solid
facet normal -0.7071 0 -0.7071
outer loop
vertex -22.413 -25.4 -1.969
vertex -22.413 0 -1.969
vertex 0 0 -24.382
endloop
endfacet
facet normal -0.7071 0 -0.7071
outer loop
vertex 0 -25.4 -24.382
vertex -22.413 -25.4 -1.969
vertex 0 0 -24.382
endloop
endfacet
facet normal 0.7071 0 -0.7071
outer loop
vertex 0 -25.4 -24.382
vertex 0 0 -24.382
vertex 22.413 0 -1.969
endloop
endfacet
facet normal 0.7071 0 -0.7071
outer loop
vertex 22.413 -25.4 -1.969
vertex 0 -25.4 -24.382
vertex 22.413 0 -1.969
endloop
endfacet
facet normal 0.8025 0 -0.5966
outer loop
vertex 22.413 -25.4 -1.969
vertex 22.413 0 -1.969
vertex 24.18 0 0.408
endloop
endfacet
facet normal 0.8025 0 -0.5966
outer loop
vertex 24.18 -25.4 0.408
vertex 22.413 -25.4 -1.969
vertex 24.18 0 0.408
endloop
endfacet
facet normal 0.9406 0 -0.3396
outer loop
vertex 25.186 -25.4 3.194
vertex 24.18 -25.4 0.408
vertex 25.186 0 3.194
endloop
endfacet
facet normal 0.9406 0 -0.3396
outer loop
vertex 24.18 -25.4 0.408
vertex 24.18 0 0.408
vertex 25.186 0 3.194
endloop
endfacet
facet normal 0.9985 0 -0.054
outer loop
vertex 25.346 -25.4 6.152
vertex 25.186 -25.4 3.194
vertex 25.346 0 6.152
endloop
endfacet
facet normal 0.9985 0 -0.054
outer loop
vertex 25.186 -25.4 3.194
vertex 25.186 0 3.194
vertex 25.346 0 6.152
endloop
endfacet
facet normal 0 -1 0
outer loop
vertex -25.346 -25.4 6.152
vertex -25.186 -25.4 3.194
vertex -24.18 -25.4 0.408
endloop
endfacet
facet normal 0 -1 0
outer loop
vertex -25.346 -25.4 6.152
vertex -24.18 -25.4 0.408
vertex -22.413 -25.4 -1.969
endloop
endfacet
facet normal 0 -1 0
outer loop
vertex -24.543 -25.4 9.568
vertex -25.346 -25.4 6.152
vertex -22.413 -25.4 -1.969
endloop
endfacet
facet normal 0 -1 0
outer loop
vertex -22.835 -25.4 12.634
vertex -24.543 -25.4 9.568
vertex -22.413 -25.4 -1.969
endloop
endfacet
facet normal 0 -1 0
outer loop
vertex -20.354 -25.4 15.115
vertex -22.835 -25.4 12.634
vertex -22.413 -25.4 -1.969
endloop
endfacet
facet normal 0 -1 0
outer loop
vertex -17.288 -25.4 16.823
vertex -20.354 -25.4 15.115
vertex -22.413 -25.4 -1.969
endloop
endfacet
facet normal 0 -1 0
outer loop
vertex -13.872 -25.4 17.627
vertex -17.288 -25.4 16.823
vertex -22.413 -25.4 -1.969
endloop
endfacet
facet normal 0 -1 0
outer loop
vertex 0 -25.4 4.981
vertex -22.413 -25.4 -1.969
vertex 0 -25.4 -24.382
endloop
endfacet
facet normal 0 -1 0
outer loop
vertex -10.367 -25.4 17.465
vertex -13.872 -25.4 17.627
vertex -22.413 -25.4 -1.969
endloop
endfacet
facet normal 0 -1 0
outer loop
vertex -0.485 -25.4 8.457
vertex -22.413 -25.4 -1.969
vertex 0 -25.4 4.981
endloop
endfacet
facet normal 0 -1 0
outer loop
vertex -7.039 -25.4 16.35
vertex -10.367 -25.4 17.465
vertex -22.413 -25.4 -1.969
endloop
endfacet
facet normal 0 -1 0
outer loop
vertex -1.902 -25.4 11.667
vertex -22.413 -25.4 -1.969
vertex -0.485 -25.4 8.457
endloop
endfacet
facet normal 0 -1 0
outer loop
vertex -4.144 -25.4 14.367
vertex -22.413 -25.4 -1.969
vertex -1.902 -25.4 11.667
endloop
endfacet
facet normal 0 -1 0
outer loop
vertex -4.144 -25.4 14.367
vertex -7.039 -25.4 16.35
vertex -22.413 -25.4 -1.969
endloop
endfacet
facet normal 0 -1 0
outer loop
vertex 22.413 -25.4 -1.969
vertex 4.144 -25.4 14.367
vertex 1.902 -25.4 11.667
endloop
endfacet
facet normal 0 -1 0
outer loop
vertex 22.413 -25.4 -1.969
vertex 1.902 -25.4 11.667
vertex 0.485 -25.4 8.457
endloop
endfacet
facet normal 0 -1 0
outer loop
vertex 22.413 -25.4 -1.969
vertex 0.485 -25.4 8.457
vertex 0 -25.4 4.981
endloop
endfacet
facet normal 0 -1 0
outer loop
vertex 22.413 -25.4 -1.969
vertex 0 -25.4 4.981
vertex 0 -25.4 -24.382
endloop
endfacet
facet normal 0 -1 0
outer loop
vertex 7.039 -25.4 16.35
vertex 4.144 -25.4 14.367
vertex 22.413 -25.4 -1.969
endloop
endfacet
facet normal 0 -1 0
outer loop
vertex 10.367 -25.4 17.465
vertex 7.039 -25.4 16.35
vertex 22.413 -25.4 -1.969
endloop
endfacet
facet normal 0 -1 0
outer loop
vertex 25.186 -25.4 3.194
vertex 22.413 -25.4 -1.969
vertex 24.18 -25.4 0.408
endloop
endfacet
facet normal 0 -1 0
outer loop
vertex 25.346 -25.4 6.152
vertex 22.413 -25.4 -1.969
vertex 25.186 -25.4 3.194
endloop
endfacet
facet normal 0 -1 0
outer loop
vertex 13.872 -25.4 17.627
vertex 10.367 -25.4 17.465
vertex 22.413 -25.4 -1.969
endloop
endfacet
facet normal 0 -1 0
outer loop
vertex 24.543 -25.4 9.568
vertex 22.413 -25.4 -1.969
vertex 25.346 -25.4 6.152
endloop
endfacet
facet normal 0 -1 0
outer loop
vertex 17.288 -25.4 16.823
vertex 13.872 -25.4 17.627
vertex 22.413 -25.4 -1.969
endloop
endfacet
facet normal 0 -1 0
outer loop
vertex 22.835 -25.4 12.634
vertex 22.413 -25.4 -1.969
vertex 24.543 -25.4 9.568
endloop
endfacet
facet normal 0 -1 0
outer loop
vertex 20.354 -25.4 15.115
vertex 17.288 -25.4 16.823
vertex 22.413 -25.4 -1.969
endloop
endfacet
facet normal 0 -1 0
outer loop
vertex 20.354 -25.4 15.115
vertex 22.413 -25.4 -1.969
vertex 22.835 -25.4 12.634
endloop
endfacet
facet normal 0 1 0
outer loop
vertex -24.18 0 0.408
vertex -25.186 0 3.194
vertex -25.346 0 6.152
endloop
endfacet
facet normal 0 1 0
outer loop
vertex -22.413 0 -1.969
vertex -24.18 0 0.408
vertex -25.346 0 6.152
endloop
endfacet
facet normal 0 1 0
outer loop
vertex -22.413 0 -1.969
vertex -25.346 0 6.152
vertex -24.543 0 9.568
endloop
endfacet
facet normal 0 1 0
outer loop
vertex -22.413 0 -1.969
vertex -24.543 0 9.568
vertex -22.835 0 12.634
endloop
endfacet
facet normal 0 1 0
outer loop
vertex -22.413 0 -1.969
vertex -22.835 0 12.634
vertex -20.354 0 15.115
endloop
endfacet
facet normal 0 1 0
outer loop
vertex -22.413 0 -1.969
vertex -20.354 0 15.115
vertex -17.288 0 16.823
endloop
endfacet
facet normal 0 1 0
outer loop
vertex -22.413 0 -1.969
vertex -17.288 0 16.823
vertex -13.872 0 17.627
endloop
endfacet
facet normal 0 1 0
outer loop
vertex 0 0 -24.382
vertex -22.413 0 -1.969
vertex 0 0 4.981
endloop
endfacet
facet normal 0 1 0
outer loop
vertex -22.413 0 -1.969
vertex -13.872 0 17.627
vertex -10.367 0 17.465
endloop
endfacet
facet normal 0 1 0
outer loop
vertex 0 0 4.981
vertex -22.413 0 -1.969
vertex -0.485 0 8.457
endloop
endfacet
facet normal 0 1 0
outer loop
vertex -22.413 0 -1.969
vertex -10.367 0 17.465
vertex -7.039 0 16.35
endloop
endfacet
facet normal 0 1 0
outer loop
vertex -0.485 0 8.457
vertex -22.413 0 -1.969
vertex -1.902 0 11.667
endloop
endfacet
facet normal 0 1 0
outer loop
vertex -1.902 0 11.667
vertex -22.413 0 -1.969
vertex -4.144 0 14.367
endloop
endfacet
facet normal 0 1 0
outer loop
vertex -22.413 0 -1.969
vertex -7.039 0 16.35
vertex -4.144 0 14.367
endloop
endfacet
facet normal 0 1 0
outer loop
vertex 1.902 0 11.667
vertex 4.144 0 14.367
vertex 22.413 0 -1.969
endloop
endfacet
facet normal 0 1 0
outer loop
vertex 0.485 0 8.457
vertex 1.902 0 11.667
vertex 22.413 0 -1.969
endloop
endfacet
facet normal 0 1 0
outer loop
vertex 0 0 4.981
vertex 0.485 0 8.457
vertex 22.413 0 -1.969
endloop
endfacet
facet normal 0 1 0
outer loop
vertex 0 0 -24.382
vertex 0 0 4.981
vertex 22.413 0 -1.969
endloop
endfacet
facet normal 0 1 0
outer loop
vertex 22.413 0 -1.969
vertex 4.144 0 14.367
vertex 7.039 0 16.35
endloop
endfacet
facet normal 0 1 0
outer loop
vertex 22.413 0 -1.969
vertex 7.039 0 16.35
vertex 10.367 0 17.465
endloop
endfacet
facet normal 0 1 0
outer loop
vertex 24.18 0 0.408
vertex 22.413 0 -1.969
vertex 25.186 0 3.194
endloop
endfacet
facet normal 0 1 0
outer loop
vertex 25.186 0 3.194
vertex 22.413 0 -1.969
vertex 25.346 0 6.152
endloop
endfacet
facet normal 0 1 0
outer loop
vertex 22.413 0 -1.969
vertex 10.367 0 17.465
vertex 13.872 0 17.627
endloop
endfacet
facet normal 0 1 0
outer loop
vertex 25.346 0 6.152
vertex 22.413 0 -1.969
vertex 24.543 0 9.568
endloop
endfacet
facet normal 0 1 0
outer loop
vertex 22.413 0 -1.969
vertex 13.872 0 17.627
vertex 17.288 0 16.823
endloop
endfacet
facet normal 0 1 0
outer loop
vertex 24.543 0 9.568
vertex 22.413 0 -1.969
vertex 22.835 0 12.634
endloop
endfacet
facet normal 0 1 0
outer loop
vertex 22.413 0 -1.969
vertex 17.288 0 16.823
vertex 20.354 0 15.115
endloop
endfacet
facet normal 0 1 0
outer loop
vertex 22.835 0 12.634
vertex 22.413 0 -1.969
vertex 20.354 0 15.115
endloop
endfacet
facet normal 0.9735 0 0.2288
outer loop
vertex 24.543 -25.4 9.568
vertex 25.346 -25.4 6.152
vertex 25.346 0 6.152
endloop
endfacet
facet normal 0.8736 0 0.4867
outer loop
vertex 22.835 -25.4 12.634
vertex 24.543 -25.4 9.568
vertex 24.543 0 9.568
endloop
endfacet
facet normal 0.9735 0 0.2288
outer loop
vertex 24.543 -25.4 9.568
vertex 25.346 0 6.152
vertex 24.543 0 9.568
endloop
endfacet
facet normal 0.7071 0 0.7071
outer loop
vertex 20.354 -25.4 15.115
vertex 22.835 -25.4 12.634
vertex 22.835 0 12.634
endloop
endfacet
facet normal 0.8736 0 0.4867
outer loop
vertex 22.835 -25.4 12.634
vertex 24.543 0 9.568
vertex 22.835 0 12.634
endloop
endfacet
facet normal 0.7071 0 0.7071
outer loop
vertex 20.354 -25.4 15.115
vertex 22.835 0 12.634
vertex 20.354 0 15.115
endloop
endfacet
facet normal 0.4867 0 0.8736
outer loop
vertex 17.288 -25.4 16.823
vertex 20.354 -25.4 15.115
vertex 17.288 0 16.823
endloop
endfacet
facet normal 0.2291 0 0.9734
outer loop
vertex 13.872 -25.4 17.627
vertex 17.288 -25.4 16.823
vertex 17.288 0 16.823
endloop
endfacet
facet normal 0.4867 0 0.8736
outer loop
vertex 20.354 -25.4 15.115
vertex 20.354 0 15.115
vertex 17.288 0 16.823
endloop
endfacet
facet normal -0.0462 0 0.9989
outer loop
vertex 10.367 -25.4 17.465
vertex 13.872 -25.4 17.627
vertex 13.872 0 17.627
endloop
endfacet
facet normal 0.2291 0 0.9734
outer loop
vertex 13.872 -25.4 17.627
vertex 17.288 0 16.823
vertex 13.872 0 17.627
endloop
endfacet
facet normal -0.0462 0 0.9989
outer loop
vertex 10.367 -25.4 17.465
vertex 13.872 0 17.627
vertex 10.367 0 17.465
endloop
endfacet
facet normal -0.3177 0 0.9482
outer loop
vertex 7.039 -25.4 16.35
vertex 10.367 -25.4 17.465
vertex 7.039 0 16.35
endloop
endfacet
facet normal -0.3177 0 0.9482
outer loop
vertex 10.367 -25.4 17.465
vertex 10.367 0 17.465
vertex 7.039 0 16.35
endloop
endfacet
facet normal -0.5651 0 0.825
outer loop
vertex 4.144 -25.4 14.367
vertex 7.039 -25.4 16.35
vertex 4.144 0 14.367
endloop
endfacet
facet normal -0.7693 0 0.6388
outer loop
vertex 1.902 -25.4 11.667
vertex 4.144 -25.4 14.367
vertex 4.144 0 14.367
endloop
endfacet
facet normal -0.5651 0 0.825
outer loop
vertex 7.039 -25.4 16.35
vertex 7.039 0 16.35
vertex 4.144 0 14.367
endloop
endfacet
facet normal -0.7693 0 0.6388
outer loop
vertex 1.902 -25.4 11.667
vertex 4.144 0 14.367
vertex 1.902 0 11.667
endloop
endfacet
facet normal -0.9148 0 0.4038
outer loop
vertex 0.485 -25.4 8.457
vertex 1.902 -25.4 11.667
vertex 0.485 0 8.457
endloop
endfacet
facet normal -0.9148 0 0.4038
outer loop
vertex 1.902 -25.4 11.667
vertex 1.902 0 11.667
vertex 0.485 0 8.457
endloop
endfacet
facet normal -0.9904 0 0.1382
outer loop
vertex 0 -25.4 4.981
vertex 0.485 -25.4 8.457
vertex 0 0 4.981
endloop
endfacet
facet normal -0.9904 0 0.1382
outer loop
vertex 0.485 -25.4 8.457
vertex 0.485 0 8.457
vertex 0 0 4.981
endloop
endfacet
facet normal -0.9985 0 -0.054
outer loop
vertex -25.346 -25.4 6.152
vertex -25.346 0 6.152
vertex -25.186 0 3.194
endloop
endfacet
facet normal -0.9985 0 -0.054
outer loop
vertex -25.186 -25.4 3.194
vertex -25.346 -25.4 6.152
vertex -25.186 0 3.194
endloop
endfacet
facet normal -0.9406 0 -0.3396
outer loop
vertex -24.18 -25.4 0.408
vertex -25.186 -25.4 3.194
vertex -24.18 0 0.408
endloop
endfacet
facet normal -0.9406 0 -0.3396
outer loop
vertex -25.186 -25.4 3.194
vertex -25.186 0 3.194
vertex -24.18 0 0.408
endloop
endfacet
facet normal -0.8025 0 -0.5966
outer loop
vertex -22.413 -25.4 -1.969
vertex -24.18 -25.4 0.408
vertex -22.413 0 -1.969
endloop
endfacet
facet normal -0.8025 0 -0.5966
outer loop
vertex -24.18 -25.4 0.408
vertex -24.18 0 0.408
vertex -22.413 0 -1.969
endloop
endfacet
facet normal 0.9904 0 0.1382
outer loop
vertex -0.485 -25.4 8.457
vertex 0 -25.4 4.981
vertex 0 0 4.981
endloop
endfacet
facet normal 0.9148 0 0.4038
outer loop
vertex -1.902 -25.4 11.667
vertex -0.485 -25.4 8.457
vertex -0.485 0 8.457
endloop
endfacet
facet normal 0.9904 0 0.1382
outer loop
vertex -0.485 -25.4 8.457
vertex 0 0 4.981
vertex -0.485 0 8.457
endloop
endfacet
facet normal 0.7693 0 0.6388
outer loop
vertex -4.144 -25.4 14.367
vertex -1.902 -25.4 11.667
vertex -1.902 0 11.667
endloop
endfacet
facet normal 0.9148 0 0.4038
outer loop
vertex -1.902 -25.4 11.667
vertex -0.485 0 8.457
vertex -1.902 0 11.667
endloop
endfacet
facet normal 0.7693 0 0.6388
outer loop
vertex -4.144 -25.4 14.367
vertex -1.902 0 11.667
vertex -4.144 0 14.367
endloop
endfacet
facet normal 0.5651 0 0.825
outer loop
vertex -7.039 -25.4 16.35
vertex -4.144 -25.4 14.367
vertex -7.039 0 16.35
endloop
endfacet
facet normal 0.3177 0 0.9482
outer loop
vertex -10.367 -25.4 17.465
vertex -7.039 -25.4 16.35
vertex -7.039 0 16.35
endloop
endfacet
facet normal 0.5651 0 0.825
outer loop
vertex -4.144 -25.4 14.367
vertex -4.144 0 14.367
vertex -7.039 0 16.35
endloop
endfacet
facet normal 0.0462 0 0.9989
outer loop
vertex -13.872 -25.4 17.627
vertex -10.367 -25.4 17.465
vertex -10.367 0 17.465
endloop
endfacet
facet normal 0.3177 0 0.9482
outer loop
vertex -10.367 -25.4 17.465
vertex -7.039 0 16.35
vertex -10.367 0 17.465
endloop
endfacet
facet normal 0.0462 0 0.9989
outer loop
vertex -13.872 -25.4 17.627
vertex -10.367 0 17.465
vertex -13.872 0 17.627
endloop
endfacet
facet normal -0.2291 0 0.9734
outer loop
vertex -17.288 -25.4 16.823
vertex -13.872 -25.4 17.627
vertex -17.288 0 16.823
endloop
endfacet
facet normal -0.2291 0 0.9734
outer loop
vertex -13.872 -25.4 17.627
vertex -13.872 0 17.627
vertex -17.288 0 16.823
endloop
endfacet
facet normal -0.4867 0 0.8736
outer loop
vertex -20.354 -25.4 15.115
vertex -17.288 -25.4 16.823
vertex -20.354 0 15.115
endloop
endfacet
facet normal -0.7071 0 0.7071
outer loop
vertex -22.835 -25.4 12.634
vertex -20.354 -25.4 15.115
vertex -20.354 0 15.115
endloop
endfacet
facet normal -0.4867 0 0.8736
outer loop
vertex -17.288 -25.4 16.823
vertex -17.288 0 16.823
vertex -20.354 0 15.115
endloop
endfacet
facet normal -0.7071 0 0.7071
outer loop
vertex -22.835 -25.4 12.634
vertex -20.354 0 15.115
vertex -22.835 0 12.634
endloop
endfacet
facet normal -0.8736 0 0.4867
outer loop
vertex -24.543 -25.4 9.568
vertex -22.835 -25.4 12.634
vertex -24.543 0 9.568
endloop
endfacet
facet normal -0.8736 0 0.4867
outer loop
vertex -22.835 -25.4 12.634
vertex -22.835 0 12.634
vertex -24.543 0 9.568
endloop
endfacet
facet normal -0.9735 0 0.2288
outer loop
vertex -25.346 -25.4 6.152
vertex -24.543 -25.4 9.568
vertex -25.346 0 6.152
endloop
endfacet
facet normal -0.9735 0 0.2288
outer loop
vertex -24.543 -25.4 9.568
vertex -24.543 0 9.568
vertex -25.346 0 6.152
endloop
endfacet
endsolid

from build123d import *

# Parameters (mm, degrees)
F1_DEPTH = 25.4


with BuildPart() as f1:
    # F0 (on Front) → F1 (new body)
    with BuildSketch(Plane.XZ):
        with BuildLine():
            Line((-22.413391, -1.969051), (0, -24.382442))
            Line((0, -24.382442), (22.413391, -1.969051))
            ThreePointArc((22.413391, -1.969051), (24.785195, 1.764316), (25.345929, 6.151691))
            ThreePointArc((25.345929, 6.151691), (12.11404, 17.667495), (0, 4.98102))
            ThreePointArc((0, 4.98102), (-12.11404, 17.667495), (-25.345929, 6.151691))
            ThreePointArc((-25.345929, 6.151691), (-24.785195, 1.764316), (-22.413391, -1.969051))
        make_face()
    extrude(amount=F1_DEPTH)


solid = f1.part
